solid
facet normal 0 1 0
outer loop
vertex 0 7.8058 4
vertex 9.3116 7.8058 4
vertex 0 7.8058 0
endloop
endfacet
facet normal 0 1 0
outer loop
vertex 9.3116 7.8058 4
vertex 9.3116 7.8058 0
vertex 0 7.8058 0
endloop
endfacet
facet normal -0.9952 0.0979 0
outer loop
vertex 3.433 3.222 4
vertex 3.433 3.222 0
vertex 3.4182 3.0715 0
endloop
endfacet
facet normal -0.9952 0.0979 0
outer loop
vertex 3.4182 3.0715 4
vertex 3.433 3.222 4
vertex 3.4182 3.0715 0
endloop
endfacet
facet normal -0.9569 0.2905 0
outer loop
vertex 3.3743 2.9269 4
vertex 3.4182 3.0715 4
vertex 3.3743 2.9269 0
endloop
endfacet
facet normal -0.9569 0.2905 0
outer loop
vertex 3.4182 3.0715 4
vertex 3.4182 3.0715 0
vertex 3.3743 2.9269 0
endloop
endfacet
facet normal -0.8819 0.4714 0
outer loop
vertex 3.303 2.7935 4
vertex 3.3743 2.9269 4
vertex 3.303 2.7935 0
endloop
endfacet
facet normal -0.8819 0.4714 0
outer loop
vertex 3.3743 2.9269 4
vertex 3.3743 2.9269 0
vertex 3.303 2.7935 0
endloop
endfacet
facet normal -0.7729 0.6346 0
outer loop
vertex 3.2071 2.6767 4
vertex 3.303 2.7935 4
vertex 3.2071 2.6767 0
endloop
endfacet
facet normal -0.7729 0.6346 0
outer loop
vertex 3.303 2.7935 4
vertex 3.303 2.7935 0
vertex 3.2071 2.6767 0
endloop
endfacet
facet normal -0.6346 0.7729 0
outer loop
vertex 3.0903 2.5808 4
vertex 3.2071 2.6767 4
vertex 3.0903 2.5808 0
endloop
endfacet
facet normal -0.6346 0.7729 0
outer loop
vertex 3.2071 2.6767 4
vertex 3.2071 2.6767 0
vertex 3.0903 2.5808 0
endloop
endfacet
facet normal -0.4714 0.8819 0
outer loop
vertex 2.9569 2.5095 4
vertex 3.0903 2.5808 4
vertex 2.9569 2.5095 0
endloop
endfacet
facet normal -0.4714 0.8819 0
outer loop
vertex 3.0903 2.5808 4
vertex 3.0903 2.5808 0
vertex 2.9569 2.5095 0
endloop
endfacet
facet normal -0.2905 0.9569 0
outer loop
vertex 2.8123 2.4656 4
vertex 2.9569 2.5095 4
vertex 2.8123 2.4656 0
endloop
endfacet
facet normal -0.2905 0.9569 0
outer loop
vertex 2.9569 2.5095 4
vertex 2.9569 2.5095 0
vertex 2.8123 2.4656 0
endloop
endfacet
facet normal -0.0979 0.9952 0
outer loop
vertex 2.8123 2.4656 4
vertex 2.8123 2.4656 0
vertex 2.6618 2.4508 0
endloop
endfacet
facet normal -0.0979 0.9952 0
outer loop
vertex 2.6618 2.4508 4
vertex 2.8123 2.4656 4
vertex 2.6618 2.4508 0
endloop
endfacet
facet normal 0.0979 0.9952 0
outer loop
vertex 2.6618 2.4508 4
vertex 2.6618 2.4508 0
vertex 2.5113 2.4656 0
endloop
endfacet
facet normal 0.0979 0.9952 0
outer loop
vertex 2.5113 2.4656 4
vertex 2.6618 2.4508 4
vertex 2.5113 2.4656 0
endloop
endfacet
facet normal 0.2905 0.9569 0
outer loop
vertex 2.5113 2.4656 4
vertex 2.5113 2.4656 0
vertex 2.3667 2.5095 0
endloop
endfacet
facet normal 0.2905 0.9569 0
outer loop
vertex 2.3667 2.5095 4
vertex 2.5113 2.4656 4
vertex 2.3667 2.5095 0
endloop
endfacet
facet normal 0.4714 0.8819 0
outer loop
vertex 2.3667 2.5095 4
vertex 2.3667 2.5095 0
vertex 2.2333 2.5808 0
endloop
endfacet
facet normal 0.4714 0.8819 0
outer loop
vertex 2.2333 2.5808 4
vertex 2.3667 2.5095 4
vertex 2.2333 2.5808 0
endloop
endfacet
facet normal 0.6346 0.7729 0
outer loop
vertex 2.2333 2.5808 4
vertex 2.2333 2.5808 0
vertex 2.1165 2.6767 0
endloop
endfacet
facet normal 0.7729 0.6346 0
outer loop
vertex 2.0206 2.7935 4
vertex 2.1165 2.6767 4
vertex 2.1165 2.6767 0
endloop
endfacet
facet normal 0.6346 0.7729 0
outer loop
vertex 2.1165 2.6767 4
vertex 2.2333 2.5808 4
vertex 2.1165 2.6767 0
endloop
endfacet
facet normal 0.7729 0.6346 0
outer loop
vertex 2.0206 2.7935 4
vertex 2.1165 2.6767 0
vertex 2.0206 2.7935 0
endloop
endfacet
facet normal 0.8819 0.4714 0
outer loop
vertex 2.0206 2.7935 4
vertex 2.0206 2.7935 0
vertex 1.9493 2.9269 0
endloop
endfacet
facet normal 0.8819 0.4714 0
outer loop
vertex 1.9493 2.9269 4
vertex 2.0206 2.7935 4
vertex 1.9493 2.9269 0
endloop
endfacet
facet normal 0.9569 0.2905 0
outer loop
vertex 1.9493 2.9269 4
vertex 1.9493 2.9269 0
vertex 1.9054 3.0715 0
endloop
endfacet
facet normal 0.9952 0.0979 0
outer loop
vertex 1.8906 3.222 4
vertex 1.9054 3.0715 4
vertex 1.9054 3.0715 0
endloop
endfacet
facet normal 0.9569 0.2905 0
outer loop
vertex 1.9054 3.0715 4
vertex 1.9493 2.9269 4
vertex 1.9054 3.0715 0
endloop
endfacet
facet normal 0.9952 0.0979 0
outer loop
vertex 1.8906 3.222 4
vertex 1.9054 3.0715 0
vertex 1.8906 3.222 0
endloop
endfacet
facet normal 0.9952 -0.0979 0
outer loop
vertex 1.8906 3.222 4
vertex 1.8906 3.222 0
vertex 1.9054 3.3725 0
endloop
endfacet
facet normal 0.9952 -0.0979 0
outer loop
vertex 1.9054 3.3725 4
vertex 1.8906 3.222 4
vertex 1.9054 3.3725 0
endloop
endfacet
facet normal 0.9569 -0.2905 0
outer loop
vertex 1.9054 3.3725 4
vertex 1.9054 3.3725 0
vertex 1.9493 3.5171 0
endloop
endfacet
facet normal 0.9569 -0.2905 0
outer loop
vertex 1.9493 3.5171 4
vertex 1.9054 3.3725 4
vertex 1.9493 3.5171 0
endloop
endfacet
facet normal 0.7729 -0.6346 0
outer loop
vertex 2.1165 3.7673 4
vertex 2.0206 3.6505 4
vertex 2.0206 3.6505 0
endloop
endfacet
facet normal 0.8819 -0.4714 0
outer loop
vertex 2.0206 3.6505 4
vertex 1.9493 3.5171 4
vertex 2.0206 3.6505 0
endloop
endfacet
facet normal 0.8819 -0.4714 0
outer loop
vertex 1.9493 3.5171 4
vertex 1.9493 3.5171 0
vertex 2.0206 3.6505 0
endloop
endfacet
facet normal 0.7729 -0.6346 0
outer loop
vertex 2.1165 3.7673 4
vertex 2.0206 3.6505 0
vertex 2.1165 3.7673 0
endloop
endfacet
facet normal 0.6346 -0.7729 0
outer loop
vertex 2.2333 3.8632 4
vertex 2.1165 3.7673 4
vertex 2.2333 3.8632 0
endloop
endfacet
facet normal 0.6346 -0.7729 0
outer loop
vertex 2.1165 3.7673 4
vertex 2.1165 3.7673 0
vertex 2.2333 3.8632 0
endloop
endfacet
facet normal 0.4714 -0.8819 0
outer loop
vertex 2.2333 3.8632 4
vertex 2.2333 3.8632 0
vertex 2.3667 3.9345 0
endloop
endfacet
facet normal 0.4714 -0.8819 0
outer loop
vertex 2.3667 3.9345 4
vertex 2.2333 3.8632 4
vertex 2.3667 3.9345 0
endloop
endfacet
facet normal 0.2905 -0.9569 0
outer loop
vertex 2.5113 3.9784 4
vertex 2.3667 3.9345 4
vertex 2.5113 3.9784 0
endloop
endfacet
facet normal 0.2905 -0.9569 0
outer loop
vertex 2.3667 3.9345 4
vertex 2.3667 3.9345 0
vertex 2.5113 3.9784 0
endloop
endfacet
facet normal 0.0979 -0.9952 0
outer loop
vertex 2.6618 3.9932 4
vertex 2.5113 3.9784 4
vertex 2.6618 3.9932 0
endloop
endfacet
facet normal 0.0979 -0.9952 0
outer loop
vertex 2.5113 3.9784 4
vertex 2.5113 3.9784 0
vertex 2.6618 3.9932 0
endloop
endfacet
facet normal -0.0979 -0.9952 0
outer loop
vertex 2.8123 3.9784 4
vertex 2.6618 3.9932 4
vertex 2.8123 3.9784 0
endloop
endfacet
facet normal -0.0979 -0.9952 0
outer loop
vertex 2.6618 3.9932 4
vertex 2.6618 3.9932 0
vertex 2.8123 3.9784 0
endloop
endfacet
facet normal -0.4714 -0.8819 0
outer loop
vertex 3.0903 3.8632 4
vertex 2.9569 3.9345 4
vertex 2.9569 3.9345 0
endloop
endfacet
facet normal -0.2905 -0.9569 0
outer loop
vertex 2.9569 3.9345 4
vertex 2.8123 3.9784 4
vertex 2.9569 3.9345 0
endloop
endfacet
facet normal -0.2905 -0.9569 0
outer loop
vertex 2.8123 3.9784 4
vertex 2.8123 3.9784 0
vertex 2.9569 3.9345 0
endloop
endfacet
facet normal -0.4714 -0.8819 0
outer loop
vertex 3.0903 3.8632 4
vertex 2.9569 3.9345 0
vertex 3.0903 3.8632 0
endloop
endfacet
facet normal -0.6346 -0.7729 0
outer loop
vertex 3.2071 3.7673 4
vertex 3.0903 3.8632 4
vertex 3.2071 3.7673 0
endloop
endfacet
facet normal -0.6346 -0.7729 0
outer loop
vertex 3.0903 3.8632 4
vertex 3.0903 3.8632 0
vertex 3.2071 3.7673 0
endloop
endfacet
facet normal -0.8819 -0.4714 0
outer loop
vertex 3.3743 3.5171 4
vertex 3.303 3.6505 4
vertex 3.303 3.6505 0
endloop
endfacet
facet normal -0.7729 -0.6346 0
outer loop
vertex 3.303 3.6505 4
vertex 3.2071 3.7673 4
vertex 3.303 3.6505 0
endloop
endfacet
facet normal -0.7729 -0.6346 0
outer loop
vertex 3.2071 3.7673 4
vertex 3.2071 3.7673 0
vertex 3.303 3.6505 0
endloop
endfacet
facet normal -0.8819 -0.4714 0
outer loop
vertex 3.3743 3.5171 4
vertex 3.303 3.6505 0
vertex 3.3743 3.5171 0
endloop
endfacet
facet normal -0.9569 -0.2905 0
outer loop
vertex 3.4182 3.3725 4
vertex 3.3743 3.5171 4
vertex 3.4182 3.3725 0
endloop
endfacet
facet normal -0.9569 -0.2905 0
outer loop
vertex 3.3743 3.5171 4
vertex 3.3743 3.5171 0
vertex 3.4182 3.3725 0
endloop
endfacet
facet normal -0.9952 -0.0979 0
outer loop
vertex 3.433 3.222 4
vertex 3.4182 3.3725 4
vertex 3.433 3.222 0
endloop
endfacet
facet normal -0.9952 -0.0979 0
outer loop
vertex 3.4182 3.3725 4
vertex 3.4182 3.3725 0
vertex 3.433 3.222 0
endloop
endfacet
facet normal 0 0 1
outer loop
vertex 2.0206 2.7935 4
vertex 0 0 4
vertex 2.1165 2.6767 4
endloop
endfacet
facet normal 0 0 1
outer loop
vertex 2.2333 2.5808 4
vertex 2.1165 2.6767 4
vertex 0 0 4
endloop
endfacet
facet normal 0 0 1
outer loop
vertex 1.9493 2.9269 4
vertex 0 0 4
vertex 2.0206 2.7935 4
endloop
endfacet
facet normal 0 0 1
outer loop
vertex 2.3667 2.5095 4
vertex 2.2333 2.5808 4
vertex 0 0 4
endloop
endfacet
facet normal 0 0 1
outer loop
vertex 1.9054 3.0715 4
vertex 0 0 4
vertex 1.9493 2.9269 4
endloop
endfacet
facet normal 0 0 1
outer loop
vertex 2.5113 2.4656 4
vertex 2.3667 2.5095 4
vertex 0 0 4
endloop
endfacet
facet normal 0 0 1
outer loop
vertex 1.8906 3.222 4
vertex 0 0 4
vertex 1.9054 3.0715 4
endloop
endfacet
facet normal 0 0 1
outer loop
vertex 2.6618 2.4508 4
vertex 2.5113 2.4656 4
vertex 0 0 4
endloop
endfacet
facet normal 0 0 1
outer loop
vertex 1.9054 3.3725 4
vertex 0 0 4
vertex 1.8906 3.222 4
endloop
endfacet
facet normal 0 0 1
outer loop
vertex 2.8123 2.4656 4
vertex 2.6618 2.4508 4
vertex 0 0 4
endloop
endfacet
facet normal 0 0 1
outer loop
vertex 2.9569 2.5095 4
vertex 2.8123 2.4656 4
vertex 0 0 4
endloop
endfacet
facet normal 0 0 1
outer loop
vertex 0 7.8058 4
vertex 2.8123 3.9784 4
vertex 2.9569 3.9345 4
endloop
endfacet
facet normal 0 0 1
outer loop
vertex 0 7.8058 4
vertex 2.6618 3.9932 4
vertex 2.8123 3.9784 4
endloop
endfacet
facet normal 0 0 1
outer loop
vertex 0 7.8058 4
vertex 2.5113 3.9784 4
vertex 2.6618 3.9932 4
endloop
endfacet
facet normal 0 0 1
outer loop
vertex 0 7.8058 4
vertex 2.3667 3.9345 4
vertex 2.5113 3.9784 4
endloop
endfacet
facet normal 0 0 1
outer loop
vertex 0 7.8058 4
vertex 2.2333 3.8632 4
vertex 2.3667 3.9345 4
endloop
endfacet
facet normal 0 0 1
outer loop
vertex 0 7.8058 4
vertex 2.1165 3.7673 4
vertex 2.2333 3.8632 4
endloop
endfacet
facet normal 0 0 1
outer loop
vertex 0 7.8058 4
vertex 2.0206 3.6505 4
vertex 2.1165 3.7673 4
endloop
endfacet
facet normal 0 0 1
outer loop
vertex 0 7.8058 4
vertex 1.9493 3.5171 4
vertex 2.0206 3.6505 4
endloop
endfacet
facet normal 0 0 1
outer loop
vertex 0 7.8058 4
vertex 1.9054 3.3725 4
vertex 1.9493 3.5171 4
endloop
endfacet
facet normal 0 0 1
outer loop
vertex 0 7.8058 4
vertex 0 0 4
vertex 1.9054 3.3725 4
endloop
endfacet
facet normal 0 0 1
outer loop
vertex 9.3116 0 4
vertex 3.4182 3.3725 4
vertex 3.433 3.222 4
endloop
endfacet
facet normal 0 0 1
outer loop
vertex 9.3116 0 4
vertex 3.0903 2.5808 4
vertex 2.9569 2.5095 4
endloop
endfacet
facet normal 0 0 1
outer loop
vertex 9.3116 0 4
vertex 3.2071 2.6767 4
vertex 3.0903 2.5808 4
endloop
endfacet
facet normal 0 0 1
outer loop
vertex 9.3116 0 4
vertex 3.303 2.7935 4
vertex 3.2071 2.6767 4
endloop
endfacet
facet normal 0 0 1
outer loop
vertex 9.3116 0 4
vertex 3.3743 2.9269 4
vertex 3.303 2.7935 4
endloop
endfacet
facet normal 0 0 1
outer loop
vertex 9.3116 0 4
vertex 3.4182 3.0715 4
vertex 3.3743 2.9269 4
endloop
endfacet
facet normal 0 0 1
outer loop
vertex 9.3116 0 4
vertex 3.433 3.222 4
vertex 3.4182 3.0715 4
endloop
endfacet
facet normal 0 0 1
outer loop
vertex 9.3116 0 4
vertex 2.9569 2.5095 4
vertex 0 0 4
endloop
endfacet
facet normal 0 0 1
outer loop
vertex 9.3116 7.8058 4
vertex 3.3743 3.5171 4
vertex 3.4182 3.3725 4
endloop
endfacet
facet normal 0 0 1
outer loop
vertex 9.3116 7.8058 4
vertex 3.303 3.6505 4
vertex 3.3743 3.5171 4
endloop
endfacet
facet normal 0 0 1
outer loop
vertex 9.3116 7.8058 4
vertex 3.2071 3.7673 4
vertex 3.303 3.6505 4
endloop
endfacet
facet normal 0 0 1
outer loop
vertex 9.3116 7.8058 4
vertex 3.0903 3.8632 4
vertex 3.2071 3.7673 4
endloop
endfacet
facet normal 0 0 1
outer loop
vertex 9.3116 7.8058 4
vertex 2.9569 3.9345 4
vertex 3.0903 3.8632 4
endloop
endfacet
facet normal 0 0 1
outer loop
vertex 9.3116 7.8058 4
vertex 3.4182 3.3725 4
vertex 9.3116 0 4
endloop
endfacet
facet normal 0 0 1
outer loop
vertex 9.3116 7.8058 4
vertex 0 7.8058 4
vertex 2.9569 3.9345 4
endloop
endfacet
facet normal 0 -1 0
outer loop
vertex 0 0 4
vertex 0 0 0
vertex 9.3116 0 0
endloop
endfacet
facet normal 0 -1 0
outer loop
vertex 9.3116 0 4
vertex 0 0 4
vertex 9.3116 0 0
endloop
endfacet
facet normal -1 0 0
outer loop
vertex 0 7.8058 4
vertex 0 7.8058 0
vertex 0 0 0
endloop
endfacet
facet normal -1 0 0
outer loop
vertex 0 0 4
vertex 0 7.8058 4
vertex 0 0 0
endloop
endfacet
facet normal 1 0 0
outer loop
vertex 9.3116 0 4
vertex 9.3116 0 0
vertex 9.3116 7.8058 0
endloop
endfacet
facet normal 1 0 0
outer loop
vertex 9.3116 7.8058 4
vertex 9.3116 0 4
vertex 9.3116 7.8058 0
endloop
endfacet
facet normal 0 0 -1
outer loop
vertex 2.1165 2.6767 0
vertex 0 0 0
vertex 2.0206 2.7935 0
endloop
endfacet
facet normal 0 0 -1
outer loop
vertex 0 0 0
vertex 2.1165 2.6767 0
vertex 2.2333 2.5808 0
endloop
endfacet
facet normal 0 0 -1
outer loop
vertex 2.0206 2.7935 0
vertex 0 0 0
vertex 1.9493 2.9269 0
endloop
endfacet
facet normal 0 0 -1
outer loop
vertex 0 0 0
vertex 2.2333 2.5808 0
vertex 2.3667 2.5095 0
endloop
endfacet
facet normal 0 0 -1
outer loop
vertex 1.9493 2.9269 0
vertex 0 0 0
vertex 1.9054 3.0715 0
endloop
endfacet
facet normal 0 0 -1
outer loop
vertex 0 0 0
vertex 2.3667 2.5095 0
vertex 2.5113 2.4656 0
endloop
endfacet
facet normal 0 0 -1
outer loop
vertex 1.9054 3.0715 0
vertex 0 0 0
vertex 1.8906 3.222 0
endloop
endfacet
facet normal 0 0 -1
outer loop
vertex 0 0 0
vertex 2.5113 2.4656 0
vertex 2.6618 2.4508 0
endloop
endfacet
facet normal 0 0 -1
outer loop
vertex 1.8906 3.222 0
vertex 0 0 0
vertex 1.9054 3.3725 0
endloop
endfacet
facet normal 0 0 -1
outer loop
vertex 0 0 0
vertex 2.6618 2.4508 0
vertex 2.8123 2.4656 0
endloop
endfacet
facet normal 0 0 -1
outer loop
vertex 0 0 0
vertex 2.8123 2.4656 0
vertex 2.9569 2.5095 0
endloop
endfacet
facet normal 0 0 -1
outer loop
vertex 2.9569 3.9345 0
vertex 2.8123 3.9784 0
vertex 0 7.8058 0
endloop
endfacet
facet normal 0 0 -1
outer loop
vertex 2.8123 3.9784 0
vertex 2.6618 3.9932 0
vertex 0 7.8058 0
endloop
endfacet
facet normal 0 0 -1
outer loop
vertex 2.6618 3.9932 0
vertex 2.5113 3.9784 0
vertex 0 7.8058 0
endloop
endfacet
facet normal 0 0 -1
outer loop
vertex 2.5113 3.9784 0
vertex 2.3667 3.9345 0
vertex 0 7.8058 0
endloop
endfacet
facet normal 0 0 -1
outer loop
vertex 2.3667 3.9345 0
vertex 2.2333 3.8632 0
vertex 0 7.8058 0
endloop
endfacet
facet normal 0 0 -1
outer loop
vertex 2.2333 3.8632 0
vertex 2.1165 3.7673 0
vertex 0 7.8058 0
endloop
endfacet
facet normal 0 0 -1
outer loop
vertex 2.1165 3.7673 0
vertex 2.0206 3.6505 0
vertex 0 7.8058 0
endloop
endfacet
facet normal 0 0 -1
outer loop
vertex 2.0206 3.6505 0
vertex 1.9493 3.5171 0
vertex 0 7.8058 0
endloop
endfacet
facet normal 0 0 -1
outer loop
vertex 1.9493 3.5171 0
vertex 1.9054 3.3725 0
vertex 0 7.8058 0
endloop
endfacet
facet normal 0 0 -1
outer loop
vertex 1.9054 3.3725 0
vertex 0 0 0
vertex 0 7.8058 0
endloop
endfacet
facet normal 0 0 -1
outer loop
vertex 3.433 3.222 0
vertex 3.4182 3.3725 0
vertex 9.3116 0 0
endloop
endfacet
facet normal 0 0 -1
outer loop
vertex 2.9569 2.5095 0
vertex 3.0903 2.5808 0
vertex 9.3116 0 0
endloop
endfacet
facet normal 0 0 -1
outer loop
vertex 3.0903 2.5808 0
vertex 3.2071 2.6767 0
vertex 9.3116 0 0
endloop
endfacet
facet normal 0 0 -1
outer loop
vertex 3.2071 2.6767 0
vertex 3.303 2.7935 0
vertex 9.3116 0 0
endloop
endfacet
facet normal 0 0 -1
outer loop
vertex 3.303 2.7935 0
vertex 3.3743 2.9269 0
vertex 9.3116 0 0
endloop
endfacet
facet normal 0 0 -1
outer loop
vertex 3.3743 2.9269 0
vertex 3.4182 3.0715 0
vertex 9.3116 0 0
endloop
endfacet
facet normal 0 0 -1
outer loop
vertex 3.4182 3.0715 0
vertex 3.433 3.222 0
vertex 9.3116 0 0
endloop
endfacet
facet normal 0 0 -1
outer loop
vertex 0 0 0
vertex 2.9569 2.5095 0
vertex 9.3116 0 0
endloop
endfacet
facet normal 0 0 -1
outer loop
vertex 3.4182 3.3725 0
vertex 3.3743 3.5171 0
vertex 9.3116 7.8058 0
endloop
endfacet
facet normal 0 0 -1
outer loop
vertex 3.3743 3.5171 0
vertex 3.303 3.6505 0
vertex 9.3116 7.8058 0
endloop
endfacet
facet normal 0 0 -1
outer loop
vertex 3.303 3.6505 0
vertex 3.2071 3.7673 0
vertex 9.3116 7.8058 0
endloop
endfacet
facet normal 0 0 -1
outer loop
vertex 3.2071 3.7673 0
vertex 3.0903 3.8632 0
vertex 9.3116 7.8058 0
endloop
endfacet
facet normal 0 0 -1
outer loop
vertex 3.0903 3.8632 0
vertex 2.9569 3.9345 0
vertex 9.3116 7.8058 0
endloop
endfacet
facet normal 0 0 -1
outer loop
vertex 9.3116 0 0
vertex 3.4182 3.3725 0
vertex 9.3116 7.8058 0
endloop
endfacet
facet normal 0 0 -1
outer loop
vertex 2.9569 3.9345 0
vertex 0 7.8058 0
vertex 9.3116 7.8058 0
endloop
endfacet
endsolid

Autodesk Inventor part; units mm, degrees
ref_plane "YZ Plane" through (0, 0, 0) normal (1, 0, 0) x (0, 1, 0)
ref_plane "XZ Plane" through (0, 0, 0) normal (0, 1, 0) x (-1, 0, 0)
sketch "Sketch1" plane through (0, 0, 0) normal (0, 0, 1) x (1, 0, 0)
  line L0 (0, 0) -> (9.3116, 0)
  line L1 (9.3116, 0) -> (9.3116, 7.8058)
  line L2 (9.3116, 7.8058) -> (0, 7.8058)
  line L3 (0, 7.8058) -> (0, 0)
  circle A0 centre (2.6618, 3.222) radius 0.7712
  dimension "d0" = 9.3116
  dimension "d1" = 7.8058
  dimension "d2" = 2.6618
  dimension "d3" = 3.222
  dimension "d4" = 1.5424
extrude "Extrusion1" add sketch "Sketch1" along normal blind 4
properties part number "testdelete"
